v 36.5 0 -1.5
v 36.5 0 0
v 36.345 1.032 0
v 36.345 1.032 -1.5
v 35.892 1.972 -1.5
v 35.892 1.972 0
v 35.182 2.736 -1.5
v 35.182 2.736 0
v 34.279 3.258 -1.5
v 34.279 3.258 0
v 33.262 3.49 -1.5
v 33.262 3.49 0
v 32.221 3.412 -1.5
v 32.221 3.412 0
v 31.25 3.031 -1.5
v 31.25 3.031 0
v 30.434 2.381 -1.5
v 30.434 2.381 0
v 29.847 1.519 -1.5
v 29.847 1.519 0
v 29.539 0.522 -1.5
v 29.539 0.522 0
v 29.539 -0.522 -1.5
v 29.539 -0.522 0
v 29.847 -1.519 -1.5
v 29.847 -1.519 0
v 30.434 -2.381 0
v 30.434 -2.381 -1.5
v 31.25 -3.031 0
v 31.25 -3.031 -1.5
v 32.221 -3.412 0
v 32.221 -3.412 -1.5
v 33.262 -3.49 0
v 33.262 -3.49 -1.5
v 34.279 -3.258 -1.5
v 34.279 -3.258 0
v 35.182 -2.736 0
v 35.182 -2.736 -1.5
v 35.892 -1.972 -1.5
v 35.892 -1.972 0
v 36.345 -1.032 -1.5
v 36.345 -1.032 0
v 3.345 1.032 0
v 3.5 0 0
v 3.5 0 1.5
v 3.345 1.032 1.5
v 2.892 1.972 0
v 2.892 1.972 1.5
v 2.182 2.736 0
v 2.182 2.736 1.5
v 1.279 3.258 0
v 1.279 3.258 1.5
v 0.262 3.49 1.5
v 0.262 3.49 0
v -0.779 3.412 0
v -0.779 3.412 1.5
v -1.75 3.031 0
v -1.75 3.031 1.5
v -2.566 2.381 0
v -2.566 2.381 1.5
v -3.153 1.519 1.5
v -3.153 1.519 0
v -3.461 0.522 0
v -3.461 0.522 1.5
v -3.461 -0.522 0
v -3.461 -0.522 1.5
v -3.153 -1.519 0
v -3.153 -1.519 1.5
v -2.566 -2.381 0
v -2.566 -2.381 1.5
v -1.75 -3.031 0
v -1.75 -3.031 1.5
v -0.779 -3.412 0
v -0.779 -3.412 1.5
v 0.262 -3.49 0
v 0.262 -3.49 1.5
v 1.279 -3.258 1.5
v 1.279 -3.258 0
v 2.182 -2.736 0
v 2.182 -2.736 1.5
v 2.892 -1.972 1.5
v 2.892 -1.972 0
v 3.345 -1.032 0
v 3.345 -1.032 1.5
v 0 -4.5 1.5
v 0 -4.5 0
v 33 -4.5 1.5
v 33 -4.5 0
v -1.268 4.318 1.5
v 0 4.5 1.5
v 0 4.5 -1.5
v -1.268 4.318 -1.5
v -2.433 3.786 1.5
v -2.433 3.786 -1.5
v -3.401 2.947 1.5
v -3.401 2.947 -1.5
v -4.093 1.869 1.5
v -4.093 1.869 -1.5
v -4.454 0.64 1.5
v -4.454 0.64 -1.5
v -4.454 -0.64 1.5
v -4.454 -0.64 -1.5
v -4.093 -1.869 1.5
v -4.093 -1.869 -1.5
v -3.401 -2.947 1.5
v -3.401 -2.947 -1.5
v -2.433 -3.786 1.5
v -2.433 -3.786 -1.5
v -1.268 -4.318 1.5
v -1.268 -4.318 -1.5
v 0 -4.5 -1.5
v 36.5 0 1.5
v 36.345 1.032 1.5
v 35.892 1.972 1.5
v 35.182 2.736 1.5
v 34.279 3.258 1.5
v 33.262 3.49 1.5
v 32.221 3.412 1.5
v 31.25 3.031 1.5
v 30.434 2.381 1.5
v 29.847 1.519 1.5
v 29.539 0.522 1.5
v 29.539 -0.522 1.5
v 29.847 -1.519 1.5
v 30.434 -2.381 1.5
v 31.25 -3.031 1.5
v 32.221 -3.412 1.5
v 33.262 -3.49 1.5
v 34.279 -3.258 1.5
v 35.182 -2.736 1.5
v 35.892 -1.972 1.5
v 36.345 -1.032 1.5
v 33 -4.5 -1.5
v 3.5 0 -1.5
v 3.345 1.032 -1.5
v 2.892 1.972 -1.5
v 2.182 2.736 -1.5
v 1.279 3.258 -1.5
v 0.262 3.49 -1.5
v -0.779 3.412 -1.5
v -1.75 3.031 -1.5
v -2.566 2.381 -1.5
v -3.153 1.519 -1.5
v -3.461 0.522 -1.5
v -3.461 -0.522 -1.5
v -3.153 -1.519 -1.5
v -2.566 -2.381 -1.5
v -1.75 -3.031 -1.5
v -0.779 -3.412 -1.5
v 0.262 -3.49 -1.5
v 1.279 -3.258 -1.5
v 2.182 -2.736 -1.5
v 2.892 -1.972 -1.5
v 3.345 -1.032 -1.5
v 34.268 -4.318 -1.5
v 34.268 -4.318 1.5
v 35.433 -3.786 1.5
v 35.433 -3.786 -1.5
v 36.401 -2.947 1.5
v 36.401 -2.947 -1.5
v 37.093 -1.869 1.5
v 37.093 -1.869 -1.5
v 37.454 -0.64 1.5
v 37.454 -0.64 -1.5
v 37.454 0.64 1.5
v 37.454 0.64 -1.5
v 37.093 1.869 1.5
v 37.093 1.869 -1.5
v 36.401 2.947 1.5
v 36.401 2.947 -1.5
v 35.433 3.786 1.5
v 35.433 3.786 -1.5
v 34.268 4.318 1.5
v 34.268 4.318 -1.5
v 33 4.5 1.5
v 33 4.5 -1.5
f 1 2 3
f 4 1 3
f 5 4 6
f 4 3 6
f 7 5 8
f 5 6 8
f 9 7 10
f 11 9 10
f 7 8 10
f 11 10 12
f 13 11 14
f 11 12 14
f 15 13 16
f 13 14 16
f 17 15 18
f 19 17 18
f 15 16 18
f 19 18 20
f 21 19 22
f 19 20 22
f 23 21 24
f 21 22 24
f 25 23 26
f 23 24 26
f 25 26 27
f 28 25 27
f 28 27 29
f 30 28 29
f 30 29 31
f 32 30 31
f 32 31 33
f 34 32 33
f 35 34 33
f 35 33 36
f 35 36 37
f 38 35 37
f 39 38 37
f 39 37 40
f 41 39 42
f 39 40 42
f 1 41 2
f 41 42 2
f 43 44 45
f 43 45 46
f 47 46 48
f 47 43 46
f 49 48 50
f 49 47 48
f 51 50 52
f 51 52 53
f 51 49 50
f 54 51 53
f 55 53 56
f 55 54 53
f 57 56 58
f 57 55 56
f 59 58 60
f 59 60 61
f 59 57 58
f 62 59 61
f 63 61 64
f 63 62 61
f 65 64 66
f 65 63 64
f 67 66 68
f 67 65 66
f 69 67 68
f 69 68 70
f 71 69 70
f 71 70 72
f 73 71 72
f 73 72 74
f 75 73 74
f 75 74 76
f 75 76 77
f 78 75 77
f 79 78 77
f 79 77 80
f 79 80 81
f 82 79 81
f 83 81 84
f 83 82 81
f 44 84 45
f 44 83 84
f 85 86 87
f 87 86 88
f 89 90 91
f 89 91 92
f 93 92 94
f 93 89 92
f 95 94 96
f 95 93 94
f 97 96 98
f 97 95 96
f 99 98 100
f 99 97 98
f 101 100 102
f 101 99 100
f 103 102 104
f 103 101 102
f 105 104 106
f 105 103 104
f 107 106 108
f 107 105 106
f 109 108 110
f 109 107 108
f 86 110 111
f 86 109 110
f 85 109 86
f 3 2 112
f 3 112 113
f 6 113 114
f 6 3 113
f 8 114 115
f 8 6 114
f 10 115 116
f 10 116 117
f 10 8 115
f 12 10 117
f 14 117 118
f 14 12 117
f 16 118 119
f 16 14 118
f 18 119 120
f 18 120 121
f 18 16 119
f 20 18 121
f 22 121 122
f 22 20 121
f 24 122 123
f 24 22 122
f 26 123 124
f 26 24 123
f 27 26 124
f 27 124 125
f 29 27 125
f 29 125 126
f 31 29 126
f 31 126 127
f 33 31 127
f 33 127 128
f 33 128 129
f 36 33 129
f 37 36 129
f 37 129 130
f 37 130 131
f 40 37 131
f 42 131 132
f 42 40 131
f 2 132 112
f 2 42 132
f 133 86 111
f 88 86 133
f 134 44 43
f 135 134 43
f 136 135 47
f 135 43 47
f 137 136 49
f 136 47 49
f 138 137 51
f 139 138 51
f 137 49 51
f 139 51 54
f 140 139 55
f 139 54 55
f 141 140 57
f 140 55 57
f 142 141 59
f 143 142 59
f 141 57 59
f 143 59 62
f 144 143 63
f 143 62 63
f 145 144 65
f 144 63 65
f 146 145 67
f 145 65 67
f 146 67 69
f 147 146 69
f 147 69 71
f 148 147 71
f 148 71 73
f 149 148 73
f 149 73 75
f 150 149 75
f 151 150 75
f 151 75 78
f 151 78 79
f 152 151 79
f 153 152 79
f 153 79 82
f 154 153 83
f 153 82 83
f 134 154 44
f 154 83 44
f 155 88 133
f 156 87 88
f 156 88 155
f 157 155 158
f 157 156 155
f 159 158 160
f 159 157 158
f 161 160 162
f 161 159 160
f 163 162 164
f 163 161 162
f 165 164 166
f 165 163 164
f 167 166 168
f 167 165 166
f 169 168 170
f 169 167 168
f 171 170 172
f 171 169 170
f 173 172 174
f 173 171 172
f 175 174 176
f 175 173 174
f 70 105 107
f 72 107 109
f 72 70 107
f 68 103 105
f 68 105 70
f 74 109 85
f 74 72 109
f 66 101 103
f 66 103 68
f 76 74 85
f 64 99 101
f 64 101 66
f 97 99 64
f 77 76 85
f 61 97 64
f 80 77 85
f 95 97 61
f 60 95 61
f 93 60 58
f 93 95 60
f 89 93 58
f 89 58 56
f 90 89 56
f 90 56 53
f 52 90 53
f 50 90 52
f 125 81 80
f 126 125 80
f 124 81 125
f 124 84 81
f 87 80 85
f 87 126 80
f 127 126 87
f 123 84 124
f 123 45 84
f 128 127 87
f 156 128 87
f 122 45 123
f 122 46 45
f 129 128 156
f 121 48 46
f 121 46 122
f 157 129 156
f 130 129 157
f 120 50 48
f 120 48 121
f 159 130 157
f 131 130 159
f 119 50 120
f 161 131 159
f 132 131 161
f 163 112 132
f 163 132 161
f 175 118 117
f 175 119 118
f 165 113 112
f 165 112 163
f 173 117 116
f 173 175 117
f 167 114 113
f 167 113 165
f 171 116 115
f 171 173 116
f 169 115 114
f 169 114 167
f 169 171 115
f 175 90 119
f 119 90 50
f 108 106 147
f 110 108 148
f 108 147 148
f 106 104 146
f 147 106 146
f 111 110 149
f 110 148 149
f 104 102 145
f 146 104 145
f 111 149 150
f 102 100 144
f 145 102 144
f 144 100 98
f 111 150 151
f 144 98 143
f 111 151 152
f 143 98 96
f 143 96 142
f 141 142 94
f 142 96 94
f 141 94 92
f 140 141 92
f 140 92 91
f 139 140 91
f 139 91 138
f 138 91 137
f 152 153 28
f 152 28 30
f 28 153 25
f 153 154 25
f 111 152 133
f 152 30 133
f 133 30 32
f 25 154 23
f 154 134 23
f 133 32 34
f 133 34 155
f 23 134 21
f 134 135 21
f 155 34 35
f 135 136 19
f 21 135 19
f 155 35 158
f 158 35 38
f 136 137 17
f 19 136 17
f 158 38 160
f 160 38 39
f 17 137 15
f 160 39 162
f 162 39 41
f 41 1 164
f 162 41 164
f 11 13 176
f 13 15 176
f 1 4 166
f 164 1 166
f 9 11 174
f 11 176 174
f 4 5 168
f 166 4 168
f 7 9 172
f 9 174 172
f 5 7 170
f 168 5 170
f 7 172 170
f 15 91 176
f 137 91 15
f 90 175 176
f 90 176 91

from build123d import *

# Parameters (mm, degrees)
SKETCH_1_R      = 3.5
EXTRUDE_1_DEPTH = 1.5


with BuildPart() as part:
    # 草图1 → 凸台-拉伸1 (new, symmetric)
    with BuildSketch(Plane.XY):
        with BuildLine():
            Line((33, 4.5), (0, 4.5))
            ThreePointArc((0, 4.5), (-4.5, 0), (0, -4.5))
            Line((0, -4.5), (33, -4.5))
            ThreePointArc((33, -4.5), (37.5, 0), (33, 4.5))
        make_face()
        with Locations((33, 0)):
            Circle(SKETCH_1_R, mode=Mode.SUBTRACT)
        Circle(SKETCH_1_R, mode=Mode.SUBTRACT)
    extrude(amount=EXTRUDE_1_DEPTH, both=True)


solid = part.part
